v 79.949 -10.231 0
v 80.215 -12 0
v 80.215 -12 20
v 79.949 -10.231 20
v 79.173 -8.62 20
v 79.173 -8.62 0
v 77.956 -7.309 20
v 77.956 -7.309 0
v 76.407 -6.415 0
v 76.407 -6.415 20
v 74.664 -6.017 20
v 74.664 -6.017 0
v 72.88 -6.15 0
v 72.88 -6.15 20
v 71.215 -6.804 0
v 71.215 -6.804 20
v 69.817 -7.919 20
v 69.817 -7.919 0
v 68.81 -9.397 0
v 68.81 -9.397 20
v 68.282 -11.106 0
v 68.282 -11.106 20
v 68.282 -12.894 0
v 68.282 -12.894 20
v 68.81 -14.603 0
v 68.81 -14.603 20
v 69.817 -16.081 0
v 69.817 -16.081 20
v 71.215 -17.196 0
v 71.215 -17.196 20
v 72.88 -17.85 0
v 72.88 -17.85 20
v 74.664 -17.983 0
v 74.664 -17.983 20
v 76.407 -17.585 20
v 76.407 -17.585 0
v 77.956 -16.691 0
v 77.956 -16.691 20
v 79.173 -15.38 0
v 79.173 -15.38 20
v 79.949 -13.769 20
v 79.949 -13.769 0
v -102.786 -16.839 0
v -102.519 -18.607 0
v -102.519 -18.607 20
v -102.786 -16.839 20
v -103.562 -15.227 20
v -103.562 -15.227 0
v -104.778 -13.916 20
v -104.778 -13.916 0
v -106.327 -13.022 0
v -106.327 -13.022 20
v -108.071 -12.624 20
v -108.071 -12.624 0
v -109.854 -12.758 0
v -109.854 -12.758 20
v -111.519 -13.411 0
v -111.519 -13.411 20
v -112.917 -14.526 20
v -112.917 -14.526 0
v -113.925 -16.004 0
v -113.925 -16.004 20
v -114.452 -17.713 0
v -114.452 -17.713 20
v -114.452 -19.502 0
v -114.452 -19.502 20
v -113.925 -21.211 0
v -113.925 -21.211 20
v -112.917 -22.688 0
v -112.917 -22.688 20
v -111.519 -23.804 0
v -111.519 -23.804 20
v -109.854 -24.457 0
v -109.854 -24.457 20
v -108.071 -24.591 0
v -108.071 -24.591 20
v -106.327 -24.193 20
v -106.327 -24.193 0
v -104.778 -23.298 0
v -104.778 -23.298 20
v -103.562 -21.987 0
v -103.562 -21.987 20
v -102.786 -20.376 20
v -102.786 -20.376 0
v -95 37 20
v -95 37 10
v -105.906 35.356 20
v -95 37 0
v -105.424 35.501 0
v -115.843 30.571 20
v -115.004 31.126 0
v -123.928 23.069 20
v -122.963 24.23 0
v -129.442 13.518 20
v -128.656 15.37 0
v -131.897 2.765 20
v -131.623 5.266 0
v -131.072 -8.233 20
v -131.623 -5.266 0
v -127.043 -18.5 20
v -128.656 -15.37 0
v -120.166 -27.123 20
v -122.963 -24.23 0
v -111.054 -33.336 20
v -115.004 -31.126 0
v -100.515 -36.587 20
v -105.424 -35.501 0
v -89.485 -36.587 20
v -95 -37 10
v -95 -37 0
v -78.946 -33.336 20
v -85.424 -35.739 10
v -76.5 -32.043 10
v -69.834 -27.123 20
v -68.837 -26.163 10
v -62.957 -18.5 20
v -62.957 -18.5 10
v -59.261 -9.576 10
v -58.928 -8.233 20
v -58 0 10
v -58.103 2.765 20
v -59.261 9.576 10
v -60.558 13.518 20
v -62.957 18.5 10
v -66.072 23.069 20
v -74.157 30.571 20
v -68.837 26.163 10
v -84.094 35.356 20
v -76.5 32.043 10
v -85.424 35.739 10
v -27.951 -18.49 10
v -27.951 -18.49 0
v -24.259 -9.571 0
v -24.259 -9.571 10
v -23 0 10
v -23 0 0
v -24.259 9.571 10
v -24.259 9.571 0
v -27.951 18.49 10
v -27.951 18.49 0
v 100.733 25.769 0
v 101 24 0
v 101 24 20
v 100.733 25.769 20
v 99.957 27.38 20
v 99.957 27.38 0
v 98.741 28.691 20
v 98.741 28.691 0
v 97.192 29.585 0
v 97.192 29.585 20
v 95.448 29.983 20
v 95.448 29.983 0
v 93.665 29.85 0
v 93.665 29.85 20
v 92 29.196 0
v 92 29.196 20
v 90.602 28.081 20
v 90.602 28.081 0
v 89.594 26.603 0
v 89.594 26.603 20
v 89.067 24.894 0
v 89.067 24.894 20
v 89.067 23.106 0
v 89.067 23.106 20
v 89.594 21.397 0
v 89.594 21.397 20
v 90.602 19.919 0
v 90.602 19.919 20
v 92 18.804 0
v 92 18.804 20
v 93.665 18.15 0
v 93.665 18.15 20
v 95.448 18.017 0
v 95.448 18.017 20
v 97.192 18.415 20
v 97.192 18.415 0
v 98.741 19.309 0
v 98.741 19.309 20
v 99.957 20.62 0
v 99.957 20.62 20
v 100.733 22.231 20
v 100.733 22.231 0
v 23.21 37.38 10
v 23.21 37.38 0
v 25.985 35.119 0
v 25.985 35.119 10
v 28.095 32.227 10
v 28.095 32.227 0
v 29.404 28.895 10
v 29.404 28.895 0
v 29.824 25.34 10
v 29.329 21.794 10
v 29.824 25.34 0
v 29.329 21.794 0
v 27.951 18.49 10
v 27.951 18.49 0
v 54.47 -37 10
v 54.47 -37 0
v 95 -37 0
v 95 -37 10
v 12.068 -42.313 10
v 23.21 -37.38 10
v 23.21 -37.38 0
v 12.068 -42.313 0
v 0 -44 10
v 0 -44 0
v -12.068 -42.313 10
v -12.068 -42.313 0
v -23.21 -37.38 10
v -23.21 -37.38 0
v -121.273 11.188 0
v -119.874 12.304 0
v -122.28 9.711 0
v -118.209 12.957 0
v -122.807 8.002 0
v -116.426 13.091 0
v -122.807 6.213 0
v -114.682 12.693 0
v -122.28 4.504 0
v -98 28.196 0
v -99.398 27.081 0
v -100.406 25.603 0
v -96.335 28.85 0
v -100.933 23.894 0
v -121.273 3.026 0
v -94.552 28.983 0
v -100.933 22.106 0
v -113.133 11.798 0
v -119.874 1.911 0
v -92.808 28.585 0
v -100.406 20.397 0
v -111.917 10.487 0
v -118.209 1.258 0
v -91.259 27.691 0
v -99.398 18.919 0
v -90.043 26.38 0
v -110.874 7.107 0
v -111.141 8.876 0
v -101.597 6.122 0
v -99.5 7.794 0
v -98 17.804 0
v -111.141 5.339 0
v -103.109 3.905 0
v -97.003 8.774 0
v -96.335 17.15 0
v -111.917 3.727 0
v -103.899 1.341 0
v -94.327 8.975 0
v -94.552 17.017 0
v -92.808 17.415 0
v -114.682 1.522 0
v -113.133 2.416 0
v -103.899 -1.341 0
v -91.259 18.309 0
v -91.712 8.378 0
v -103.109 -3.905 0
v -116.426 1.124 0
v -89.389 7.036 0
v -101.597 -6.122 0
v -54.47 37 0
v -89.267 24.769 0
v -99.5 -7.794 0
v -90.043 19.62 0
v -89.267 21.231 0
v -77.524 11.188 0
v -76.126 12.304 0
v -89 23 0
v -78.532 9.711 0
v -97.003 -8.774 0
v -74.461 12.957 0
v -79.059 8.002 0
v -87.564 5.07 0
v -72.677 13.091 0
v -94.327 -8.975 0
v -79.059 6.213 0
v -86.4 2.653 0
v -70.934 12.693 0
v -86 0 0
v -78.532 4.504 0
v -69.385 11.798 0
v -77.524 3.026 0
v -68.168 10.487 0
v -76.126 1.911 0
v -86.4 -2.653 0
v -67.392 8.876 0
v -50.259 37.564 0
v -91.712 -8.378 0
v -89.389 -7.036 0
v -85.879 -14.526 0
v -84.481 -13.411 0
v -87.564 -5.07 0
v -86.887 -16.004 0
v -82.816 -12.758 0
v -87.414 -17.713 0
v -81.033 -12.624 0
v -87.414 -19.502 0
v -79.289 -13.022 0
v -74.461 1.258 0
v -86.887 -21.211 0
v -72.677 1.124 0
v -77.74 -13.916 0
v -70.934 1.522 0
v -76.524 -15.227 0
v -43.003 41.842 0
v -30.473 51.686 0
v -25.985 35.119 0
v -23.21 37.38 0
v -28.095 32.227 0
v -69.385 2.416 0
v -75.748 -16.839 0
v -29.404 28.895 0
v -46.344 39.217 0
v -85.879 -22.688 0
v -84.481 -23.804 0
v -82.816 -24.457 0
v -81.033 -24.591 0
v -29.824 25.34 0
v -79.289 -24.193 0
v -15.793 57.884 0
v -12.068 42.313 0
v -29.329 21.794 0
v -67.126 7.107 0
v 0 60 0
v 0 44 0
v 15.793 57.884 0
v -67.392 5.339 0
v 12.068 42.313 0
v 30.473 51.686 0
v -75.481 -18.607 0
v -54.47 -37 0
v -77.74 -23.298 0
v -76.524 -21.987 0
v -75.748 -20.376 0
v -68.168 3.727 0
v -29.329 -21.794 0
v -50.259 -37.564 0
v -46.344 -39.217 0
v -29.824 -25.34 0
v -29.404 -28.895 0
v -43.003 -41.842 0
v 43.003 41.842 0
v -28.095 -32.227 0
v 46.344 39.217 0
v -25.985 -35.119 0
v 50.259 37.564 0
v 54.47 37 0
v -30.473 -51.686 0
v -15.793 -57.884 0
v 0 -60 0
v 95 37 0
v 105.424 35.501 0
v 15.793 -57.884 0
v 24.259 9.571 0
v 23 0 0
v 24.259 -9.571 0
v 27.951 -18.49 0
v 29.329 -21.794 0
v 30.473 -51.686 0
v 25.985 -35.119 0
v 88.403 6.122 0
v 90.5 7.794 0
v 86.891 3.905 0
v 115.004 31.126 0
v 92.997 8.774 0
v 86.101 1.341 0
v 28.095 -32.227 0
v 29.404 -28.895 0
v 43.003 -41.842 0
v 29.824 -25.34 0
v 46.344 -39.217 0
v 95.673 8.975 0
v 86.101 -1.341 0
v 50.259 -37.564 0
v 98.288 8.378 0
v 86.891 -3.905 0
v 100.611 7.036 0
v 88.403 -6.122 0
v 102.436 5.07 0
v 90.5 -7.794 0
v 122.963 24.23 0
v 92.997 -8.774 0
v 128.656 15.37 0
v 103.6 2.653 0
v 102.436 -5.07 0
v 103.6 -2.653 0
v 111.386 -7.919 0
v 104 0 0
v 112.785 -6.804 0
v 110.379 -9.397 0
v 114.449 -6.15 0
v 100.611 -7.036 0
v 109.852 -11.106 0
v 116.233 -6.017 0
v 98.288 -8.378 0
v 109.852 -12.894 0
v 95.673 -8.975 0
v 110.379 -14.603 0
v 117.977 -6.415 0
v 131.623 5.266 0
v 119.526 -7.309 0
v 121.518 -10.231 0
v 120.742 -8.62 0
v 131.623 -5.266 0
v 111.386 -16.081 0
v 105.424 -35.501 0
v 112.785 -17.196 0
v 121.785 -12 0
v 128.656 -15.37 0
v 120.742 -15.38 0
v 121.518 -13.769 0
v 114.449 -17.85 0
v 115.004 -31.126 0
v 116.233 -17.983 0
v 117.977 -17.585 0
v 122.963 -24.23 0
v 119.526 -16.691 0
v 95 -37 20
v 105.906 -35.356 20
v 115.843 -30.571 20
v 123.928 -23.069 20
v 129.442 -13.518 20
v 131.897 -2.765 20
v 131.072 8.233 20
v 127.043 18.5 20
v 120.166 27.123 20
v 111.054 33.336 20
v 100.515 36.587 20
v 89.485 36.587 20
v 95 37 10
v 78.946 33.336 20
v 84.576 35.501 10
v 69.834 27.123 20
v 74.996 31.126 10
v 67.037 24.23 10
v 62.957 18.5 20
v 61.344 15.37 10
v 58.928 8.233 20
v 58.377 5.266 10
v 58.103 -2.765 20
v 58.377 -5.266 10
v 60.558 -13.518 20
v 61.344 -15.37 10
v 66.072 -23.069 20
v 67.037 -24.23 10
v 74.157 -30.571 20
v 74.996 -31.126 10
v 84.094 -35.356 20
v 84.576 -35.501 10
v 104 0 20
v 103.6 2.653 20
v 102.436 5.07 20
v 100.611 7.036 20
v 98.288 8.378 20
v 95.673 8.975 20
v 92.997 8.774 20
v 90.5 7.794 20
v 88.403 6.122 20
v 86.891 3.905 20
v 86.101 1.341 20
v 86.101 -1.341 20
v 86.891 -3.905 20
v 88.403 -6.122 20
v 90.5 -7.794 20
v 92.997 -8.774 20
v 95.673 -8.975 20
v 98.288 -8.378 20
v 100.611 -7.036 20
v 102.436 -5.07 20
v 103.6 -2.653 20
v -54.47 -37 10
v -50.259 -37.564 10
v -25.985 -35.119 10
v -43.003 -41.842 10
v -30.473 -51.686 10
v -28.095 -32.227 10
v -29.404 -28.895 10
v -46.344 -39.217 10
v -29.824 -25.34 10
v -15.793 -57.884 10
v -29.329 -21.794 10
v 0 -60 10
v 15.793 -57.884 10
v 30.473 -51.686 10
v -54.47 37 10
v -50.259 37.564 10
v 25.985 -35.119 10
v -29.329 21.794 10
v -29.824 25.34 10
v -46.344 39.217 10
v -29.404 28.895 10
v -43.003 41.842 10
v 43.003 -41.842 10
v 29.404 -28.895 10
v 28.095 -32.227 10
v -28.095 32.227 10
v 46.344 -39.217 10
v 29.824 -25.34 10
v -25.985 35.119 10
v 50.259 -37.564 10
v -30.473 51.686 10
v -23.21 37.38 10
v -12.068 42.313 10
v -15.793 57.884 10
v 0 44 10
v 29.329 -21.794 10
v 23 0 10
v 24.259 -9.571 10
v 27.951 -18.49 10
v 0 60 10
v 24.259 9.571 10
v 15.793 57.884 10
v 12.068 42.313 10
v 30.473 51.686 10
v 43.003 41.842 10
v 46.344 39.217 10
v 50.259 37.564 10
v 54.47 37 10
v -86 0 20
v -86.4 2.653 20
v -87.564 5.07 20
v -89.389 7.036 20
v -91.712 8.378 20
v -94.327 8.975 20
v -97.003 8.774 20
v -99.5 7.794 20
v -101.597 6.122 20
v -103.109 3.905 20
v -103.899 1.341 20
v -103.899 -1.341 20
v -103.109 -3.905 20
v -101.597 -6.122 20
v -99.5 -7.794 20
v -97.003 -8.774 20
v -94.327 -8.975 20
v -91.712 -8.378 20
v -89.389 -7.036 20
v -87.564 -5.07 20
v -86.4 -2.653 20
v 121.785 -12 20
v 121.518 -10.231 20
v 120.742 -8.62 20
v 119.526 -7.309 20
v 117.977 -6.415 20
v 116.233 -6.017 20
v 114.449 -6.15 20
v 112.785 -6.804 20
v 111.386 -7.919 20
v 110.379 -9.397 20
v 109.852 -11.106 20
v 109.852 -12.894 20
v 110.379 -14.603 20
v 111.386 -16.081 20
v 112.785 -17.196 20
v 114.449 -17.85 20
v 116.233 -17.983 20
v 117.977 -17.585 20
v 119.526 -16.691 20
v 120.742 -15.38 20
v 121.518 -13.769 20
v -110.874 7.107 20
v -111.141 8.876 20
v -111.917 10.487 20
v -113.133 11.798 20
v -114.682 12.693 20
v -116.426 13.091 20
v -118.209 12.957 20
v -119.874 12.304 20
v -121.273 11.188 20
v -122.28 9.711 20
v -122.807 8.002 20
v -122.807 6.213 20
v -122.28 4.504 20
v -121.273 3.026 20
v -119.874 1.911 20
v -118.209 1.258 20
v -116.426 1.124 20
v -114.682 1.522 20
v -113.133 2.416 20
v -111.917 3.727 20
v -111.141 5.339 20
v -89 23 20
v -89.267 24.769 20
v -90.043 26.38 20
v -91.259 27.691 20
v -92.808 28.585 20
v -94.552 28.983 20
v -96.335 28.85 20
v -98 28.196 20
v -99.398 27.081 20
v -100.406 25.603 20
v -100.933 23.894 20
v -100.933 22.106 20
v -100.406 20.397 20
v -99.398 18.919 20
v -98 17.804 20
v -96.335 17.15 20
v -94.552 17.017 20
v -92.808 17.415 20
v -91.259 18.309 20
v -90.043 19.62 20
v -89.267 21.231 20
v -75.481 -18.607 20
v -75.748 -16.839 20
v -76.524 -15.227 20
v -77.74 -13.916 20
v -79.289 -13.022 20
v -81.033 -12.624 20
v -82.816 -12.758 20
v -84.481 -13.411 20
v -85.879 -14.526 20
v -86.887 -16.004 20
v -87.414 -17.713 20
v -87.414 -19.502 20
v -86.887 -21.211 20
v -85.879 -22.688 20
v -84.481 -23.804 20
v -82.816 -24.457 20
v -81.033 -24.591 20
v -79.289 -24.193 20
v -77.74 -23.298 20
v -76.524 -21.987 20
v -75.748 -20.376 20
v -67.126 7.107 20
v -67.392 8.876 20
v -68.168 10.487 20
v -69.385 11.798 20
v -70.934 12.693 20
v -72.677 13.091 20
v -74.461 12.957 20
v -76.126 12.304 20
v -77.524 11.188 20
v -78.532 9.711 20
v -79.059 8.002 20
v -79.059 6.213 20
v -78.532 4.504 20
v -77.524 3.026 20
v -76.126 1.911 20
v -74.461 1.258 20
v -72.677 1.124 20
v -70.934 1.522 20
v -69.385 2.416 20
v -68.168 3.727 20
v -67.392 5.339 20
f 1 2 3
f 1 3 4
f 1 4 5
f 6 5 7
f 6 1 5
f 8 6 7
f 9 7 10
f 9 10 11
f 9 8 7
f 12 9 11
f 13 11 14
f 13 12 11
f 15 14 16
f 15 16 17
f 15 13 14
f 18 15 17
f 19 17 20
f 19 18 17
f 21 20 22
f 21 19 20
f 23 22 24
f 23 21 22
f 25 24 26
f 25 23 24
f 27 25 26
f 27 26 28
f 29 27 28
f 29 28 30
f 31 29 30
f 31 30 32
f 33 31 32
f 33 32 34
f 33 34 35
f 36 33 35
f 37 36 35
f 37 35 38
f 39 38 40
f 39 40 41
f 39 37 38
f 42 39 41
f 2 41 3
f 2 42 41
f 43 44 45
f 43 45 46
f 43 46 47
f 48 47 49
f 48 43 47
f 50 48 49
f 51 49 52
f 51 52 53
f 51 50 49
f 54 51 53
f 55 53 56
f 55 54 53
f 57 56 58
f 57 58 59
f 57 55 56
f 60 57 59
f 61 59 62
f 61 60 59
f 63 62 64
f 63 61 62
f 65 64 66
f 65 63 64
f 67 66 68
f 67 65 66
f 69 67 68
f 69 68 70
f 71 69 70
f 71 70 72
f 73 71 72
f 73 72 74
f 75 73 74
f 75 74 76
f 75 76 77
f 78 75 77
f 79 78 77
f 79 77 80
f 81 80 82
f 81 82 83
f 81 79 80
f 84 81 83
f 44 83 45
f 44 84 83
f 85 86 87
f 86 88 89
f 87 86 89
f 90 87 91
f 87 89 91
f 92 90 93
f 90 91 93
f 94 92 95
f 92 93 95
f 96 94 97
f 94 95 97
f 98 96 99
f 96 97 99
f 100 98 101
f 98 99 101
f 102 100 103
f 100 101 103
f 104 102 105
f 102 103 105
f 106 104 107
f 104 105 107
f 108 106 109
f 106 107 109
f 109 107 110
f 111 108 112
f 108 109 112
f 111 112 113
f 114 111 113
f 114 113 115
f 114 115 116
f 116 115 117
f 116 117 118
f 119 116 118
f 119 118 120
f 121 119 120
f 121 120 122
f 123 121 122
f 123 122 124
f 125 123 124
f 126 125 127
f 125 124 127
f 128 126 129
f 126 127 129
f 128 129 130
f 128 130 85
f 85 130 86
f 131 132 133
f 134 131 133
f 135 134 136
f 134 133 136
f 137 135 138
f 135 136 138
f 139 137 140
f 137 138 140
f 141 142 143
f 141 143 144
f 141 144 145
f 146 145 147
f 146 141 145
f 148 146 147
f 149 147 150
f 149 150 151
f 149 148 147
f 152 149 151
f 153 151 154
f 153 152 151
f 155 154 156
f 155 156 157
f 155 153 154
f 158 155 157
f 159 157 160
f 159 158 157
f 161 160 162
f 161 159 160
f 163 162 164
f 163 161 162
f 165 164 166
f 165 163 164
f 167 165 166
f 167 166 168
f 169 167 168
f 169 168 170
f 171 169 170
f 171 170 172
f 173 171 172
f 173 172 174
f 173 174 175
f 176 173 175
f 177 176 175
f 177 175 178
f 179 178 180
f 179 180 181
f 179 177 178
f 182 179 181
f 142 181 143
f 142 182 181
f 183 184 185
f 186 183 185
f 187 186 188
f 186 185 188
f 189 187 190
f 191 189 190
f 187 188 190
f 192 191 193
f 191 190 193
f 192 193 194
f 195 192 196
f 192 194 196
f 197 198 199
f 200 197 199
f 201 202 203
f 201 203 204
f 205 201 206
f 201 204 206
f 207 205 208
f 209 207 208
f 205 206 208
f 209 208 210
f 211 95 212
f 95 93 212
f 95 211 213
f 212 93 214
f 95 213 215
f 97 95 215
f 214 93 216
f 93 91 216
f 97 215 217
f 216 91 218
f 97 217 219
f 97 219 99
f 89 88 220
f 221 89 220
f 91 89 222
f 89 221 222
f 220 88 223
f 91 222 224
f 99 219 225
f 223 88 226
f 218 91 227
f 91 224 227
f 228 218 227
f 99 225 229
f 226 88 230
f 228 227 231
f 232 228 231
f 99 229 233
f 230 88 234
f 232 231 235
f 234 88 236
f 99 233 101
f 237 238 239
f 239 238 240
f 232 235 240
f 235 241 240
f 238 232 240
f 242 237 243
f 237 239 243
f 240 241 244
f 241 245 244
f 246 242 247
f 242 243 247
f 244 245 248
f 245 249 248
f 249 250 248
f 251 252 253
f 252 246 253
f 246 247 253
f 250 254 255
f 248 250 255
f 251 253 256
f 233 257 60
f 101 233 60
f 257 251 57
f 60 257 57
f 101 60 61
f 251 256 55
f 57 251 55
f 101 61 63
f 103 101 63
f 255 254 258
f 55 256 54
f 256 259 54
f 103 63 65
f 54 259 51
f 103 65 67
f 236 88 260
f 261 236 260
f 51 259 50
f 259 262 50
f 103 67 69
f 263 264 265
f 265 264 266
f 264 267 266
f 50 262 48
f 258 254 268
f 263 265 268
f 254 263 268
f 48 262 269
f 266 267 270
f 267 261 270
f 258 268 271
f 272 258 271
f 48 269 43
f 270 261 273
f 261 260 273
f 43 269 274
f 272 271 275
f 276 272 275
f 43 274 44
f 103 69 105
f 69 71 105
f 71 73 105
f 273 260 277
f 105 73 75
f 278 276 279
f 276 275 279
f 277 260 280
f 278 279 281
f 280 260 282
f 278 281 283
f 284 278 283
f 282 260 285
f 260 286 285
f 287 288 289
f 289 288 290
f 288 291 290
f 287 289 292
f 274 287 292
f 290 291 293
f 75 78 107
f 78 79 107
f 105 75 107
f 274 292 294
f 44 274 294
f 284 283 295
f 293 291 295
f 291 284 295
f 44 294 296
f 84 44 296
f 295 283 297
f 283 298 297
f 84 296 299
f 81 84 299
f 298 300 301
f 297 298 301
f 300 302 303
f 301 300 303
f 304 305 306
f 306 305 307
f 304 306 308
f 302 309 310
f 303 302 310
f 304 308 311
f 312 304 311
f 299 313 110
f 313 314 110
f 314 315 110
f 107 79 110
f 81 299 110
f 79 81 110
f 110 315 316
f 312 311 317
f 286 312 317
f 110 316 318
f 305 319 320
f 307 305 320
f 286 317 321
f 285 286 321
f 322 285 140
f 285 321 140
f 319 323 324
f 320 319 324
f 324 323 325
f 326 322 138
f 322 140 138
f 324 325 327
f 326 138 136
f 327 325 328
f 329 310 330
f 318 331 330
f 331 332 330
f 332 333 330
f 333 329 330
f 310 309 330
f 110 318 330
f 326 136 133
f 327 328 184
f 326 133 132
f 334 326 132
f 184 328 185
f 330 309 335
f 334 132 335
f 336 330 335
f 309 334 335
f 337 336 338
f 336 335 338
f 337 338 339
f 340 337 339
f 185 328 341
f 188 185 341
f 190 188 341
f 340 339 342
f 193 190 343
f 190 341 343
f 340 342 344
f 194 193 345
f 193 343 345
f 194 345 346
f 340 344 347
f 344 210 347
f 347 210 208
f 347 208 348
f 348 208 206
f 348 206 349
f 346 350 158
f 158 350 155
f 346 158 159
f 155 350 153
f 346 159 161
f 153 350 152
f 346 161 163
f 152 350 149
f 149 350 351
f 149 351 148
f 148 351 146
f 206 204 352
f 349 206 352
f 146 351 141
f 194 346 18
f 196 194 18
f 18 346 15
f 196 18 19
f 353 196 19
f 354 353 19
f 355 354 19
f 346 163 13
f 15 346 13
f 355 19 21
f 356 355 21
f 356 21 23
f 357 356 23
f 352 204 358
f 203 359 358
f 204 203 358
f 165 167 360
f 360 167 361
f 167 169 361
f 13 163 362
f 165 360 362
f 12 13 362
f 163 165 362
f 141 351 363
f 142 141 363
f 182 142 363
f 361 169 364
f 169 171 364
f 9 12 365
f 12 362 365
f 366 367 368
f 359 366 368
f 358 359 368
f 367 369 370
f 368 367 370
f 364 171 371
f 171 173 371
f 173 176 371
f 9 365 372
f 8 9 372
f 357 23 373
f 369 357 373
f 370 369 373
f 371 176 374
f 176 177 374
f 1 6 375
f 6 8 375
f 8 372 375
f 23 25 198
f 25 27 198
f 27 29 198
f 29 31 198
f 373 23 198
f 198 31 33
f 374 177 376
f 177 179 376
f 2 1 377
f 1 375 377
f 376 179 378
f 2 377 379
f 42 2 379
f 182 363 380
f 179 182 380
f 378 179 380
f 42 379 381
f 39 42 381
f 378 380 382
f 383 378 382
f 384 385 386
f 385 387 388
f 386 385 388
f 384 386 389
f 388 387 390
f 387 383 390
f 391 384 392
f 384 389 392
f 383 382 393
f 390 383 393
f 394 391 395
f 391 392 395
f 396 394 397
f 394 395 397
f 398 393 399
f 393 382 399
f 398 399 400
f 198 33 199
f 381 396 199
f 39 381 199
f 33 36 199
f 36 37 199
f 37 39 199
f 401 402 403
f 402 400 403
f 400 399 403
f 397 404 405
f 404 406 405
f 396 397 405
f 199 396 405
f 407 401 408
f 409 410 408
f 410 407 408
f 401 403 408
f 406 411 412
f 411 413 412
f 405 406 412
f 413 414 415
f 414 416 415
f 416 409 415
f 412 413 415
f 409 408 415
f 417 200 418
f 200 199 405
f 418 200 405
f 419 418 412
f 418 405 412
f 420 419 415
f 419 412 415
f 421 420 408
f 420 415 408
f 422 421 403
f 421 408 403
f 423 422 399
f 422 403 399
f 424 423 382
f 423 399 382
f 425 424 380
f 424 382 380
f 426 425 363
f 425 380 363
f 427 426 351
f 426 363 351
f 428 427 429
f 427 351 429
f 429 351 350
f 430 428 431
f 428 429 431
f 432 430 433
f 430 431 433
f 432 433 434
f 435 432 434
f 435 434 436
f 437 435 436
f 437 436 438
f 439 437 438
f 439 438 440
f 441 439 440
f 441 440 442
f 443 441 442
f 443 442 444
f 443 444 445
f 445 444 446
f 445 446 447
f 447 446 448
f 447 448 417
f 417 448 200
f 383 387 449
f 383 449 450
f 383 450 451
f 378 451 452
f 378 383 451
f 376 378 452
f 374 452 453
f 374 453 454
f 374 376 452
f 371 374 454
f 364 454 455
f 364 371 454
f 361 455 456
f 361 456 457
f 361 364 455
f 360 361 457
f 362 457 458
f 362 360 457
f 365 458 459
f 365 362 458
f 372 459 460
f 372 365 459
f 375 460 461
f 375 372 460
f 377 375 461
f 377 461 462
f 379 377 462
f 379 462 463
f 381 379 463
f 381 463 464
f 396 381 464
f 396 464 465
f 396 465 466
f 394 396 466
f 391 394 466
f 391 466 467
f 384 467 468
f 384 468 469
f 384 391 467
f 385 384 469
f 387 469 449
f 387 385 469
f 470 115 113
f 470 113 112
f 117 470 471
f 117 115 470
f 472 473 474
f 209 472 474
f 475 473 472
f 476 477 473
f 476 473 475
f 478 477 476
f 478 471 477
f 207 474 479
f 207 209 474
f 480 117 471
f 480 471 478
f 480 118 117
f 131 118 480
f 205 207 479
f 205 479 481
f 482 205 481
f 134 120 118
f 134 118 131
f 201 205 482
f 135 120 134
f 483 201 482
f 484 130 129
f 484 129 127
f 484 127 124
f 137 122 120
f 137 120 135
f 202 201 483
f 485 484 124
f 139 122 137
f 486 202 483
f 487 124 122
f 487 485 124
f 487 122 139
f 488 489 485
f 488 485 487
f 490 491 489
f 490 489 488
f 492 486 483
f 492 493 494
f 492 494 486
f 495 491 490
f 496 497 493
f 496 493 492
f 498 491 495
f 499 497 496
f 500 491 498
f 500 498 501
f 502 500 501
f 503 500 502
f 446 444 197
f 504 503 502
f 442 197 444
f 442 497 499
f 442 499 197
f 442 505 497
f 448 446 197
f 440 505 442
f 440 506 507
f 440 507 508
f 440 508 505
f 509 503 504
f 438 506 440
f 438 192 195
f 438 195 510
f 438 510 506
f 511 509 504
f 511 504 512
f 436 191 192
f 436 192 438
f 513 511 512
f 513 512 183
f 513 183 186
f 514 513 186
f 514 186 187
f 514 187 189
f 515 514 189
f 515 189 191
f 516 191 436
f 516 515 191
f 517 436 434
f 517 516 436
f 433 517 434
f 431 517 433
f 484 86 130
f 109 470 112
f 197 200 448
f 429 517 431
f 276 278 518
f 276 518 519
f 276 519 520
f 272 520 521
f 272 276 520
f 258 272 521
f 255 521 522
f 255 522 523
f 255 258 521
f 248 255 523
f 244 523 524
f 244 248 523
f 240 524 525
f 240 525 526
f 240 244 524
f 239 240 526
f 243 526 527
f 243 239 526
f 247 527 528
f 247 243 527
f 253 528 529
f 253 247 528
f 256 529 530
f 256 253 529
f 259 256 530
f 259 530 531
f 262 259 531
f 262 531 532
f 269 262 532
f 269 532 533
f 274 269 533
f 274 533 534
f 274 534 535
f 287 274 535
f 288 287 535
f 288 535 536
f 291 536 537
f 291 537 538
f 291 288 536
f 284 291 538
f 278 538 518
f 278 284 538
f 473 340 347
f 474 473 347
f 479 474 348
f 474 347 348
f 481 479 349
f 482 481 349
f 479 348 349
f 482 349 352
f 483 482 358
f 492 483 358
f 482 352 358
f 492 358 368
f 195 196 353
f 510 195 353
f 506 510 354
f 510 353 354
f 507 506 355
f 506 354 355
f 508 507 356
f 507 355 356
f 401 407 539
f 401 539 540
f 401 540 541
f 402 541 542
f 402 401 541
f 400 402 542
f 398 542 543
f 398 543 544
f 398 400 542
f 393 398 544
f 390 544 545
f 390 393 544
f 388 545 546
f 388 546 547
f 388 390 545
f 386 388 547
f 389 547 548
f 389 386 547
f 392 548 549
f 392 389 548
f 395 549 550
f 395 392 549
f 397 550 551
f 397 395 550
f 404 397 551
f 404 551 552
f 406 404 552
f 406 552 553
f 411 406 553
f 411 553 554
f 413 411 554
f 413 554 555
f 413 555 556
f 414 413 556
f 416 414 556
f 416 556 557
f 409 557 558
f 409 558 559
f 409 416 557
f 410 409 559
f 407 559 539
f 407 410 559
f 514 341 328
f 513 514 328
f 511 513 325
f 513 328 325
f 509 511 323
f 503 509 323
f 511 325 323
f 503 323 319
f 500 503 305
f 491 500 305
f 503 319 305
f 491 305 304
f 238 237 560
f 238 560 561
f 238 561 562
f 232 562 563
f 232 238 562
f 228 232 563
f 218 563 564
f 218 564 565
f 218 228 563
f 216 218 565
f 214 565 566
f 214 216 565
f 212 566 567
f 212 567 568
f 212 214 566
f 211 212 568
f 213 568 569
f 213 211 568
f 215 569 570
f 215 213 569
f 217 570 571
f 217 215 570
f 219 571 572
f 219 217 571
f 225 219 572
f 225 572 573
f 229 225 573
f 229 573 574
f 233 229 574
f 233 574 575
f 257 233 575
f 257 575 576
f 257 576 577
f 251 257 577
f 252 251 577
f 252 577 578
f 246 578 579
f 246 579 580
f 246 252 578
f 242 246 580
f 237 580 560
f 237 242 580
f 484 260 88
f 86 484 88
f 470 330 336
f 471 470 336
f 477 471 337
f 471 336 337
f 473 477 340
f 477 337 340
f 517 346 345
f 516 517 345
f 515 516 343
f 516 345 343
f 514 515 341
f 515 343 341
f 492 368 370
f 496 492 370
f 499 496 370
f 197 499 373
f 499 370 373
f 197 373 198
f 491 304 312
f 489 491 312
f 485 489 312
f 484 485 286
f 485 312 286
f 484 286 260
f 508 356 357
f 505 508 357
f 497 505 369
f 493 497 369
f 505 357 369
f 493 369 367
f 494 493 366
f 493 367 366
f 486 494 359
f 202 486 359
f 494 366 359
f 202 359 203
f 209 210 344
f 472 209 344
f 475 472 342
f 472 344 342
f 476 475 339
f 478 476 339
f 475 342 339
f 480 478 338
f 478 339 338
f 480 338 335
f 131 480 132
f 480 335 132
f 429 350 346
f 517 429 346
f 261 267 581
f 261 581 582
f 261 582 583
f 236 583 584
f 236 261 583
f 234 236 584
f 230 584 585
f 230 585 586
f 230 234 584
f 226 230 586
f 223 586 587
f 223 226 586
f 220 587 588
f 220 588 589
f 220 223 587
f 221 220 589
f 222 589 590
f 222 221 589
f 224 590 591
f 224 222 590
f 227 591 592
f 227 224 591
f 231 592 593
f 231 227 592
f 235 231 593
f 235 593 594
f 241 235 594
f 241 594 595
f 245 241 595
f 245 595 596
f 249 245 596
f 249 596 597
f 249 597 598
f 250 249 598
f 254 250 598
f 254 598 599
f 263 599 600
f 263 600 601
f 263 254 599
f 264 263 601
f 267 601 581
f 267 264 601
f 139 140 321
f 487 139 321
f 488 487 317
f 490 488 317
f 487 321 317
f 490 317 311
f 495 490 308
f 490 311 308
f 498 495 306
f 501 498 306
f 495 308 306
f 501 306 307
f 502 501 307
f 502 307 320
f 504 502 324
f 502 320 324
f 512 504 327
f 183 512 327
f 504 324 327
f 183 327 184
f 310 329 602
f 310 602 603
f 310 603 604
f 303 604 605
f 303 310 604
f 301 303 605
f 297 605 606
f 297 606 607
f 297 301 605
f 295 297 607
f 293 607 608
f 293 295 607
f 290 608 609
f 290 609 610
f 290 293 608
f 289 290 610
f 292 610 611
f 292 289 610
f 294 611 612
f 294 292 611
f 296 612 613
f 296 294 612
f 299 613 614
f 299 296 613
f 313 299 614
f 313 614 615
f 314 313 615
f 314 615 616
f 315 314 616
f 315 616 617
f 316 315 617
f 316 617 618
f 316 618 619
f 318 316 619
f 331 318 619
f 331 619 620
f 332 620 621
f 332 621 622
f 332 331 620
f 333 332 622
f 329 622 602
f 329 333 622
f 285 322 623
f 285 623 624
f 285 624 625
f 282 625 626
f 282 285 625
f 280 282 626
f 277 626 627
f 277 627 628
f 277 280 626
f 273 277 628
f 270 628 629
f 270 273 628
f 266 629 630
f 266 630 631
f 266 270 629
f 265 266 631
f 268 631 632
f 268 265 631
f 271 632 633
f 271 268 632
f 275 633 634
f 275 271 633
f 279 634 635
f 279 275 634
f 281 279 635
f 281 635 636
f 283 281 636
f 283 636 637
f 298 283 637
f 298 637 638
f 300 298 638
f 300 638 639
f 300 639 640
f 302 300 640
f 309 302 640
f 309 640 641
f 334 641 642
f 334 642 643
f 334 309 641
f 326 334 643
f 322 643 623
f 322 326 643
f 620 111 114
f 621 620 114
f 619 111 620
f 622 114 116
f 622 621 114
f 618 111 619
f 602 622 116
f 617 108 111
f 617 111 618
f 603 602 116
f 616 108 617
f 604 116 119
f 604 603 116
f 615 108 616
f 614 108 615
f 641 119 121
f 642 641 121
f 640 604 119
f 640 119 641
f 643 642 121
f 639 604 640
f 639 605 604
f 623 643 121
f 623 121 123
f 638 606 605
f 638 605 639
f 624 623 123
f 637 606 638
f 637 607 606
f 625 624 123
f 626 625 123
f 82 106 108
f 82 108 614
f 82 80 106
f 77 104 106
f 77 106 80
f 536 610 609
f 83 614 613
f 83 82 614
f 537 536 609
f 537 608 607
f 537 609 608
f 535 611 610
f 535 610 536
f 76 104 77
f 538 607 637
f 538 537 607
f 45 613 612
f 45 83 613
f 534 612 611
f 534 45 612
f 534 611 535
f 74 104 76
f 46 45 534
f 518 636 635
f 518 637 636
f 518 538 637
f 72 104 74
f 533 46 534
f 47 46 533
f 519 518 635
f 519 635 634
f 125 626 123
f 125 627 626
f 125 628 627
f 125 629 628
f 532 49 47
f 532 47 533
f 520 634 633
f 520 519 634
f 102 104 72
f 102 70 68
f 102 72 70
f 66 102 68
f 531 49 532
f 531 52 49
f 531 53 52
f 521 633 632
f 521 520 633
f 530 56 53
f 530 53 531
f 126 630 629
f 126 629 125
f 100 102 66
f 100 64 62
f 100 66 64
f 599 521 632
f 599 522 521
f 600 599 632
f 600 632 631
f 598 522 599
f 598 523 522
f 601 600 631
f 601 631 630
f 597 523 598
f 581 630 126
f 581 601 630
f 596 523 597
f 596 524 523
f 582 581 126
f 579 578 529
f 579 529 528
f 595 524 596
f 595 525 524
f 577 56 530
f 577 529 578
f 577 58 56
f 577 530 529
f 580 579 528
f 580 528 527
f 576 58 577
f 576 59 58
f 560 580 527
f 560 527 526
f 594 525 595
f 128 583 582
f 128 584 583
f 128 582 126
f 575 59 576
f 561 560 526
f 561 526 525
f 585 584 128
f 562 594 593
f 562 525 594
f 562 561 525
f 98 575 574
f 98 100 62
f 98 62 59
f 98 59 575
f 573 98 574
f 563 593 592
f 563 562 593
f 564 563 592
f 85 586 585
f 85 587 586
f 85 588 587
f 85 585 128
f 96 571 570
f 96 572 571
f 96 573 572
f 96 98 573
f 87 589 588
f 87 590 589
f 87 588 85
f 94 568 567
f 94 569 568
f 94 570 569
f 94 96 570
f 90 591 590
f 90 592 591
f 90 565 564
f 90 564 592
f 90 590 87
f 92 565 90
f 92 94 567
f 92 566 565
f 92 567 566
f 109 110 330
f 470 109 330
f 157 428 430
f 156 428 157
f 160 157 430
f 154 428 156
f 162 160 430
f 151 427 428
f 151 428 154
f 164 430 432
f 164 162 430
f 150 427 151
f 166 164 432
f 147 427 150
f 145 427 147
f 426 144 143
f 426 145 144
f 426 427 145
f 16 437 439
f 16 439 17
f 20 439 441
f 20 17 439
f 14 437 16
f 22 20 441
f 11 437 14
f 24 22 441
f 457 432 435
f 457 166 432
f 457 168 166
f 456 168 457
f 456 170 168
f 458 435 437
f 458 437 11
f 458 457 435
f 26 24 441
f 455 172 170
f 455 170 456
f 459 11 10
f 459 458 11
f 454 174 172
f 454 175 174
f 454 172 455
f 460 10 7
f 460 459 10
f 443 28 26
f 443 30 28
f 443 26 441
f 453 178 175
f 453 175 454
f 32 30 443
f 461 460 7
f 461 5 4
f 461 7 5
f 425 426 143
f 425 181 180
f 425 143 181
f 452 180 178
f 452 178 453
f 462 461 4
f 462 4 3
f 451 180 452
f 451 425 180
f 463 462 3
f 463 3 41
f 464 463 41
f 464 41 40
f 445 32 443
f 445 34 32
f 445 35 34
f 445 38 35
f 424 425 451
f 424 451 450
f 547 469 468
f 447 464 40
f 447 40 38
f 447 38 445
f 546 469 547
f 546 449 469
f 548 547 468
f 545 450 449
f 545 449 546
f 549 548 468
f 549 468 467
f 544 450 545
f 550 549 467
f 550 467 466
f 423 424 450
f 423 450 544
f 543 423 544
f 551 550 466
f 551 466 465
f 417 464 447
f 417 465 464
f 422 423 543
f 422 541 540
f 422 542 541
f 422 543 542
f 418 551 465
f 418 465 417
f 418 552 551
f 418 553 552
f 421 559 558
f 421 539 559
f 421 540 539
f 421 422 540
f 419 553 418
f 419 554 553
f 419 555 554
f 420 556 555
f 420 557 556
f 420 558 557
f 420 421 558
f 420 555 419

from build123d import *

# Parameters (mm, degrees)
EXTRUDE_1_DEPTH = 10
SKETCH_1_3_R    = 37
SKETCH_1_3_R_2  = 6
SKETCH_1_3_R_3  = 9
EXTRUDE_2_DEPTH = 20


with BuildPart() as part:
    # Эскиз1 → Бобышка-Вытянуть1 (new body)
    with BuildSketch(Plane.XY):
        with BuildLine():
            Line((-54.470175326, 37), (-95, 37))
            ThreePointArc((-95, 37), (-68.837049096, 26.162950904), (-58, 0))
            ThreePointArc((-58, 0), (-68.837049096, -26.162950904), (-95, -37))
            Line((-95, -37), (-54.470175326, -37))
            ThreePointArc((-54.470175326, -37), (-48.246282484, -38.260150683), (-43.002769994, -41.842105263))
            ThreePointArc((-43.002769994, -41.842105263), (0, -60), (43.002769994, -41.842105263))
            ThreePointArc((43.002769994, -41.842105263), (48.246282484, -38.260150683), (54.470175326, -37))
            Line((54.470175326, -37), (95, -37))
            ThreePointArc((95, -37), (58, 0), (95, 37))
            Line((95, 37), (54.470175326, 37))
            ThreePointArc((54.470175326, 37), (48.246282484, 38.260150683), (43.002769994, 41.842105263))
            ThreePointArc((43.002769994, 41.842105263), (0, 60), (-43.002769994, 41.842105263))
            ThreePointArc((-43.002769994, 41.842105263), (-48.246282484, 38.260150683), (-54.470175326, 37))
        make_face()
        with BuildLine():
            ThreePointArc((-23.21, 37.380421346), (0, 44), (23.21, 37.380421346))
            ThreePointArc((23.21, 37.380421346), (29.403784815, 28.894964715), (27.951470588, 18.490315372))
            ThreePointArc((27.951470588, 18.490315372), (23, 0), (27.951470588, -18.490315372))
            ThreePointArc((27.951470588, -18.490315372), (29.403784815, -28.894964715), (23.21, -37.380421346))
            ThreePointArc((23.21, -37.380421346), (0, -44), (-23.21, -37.380421346))
            ThreePointArc((-23.21, -37.380421346), (-29.403784815, -28.894964715), (-27.951470588, -18.490315372))
            ThreePointArc((-27.951470588, -18.490315372), (-23, 0), (-27.951470588, 18.490315372))
            ThreePointArc((-27.951470588, 18.490315372), (-29.403784815, 28.894964715), (-23.21, 37.380421346))
        make_face(mode=Mode.SUBTRACT)
    extrude(amount=EXTRUDE_1_DEPTH)

    # Эскиз1<3> → Бобышка-Вытянуть2 (add)
    # profile 1 of 2: a face of its own
    with BuildSketch(Plane.XY):
        with Locations((-95, 0)):
            Circle(SKETCH_1_3_R)
        with Locations((-73.125700125, 7.107390871)):
            Circle(SKETCH_1_3_R_2, mode=Mode.SUBTRACT)
        with Locations((-95, 23)):
            Circle(SKETCH_1_3_R_2, mode=Mode.SUBTRACT)
        with Locations((-116.874299875, 7.107390871)):
            Circle(SKETCH_1_3_R_2, mode=Mode.SUBTRACT)
        with Locations((-108.519060803, -18.607390871)):
            Circle(SKETCH_1_3_R_2, mode=Mode.SUBTRACT)
        with Locations((-81.480939197, -18.607390871)):
            Circle(SKETCH_1_3_R_2, mode=Mode.SUBTRACT)
        with Locations((-95, 0)):
            Circle(SKETCH_1_3_R_3, mode=Mode.SUBTRACT)
    # profile 2 of 2: a face of its own
    with BuildSketch(Plane.XY):
        with Locations((95, 0)):
            Circle(SKETCH_1_3_R)
        with Locations((95, 24)):
            Circle(SKETCH_1_3_R_2, mode=Mode.SUBTRACT)
        with Locations((74.215390309, -12)):
            Circle(SKETCH_1_3_R_2, mode=Mode.SUBTRACT)
        with Locations((115.784609691, -12)):
            Circle(SKETCH_1_3_R_2, mode=Mode.SUBTRACT)
        with Locations((95, 0)):
            Circle(SKETCH_1_3_R_3, mode=Mode.SUBTRACT)
    extrude(amount=EXTRUDE_2_DEPTH)


solid = part.part
